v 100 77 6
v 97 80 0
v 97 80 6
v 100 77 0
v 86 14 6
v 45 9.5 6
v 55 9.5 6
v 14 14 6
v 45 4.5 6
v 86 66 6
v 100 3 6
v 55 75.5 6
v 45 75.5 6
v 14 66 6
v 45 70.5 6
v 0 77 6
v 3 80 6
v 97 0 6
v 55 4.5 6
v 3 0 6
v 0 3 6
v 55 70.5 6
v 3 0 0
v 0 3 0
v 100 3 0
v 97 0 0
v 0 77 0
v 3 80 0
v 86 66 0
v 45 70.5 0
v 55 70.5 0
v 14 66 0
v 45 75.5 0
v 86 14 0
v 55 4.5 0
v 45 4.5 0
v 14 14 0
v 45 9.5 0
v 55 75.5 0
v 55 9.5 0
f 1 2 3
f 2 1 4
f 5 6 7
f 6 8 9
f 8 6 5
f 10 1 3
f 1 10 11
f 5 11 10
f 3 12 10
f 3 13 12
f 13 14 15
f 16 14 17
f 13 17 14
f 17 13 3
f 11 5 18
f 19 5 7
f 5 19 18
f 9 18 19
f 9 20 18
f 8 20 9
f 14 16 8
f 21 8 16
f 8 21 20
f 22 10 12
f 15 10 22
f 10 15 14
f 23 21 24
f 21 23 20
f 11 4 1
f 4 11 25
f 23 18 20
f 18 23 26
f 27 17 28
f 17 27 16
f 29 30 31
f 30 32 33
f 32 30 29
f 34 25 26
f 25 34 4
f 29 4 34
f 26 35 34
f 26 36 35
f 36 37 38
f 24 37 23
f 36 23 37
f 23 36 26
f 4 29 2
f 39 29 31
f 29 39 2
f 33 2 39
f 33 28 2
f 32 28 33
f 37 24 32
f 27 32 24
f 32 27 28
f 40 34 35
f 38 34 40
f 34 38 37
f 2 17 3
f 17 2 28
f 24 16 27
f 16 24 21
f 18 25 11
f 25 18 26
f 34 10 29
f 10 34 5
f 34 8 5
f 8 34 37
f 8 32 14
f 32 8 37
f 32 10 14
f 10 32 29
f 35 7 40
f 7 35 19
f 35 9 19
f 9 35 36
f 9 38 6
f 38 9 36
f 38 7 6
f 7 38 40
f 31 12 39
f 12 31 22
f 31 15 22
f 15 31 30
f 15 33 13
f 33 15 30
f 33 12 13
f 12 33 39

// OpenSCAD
$fn = 32;

// ----------------------------------------------------------------------
// Frame plate: 100 x 80 frame, 14 mm rails
// ----------------------------------------------------------------------

// --- parameters (mm) ---
plate_l = 100;            // plate length, X
plate_w = 80;             // plate width, Y
plate_t = 6;              // plate thickness, Z (extrusion height)
corner_c = 3;             // corner chamfer
frame_bar = 14;           // frame rail width
slot_l = 10;              // adjustment slot length
slot_w = 5;               // adjustment slot width

win_l = plate_l - 2 * frame_bar;  // window length
win_w = plate_w - 2 * frame_bar;  // window width

profile = [[3, 0], [97, 0], [100, 3], [100, 77], [97, 80], [3, 80], [0, 77], [0, 3]];  // primary outline, 8 points, counter clockwise
void_1 = [[14, 14], [86, 14], [86, 66], [14, 66]];  // the window, 4 points
void_2 = [[45, 4.5], [55, 4.5], [55, 9.5], [45, 9.5]];  // adjustment slot, 4 points
void_3 = [[45, 70.5], [55, 70.5], [55, 75.5], [45, 75.5]];  // adjustment slot, 4 points

// --- the one profile operation ---
difference() {
  linear_extrude(height = plate_t) polygon(points = profile);
  translate([0, 0, -1])
    linear_extrude(height = plate_t + 2) polygon(points = void_1);
  translate([0, 0, -1])
    linear_extrude(height = plate_t + 2) polygon(points = void_2);
  translate([0, 0, -1])
    linear_extrude(height = plate_t + 2) polygon(points = void_3);
}
